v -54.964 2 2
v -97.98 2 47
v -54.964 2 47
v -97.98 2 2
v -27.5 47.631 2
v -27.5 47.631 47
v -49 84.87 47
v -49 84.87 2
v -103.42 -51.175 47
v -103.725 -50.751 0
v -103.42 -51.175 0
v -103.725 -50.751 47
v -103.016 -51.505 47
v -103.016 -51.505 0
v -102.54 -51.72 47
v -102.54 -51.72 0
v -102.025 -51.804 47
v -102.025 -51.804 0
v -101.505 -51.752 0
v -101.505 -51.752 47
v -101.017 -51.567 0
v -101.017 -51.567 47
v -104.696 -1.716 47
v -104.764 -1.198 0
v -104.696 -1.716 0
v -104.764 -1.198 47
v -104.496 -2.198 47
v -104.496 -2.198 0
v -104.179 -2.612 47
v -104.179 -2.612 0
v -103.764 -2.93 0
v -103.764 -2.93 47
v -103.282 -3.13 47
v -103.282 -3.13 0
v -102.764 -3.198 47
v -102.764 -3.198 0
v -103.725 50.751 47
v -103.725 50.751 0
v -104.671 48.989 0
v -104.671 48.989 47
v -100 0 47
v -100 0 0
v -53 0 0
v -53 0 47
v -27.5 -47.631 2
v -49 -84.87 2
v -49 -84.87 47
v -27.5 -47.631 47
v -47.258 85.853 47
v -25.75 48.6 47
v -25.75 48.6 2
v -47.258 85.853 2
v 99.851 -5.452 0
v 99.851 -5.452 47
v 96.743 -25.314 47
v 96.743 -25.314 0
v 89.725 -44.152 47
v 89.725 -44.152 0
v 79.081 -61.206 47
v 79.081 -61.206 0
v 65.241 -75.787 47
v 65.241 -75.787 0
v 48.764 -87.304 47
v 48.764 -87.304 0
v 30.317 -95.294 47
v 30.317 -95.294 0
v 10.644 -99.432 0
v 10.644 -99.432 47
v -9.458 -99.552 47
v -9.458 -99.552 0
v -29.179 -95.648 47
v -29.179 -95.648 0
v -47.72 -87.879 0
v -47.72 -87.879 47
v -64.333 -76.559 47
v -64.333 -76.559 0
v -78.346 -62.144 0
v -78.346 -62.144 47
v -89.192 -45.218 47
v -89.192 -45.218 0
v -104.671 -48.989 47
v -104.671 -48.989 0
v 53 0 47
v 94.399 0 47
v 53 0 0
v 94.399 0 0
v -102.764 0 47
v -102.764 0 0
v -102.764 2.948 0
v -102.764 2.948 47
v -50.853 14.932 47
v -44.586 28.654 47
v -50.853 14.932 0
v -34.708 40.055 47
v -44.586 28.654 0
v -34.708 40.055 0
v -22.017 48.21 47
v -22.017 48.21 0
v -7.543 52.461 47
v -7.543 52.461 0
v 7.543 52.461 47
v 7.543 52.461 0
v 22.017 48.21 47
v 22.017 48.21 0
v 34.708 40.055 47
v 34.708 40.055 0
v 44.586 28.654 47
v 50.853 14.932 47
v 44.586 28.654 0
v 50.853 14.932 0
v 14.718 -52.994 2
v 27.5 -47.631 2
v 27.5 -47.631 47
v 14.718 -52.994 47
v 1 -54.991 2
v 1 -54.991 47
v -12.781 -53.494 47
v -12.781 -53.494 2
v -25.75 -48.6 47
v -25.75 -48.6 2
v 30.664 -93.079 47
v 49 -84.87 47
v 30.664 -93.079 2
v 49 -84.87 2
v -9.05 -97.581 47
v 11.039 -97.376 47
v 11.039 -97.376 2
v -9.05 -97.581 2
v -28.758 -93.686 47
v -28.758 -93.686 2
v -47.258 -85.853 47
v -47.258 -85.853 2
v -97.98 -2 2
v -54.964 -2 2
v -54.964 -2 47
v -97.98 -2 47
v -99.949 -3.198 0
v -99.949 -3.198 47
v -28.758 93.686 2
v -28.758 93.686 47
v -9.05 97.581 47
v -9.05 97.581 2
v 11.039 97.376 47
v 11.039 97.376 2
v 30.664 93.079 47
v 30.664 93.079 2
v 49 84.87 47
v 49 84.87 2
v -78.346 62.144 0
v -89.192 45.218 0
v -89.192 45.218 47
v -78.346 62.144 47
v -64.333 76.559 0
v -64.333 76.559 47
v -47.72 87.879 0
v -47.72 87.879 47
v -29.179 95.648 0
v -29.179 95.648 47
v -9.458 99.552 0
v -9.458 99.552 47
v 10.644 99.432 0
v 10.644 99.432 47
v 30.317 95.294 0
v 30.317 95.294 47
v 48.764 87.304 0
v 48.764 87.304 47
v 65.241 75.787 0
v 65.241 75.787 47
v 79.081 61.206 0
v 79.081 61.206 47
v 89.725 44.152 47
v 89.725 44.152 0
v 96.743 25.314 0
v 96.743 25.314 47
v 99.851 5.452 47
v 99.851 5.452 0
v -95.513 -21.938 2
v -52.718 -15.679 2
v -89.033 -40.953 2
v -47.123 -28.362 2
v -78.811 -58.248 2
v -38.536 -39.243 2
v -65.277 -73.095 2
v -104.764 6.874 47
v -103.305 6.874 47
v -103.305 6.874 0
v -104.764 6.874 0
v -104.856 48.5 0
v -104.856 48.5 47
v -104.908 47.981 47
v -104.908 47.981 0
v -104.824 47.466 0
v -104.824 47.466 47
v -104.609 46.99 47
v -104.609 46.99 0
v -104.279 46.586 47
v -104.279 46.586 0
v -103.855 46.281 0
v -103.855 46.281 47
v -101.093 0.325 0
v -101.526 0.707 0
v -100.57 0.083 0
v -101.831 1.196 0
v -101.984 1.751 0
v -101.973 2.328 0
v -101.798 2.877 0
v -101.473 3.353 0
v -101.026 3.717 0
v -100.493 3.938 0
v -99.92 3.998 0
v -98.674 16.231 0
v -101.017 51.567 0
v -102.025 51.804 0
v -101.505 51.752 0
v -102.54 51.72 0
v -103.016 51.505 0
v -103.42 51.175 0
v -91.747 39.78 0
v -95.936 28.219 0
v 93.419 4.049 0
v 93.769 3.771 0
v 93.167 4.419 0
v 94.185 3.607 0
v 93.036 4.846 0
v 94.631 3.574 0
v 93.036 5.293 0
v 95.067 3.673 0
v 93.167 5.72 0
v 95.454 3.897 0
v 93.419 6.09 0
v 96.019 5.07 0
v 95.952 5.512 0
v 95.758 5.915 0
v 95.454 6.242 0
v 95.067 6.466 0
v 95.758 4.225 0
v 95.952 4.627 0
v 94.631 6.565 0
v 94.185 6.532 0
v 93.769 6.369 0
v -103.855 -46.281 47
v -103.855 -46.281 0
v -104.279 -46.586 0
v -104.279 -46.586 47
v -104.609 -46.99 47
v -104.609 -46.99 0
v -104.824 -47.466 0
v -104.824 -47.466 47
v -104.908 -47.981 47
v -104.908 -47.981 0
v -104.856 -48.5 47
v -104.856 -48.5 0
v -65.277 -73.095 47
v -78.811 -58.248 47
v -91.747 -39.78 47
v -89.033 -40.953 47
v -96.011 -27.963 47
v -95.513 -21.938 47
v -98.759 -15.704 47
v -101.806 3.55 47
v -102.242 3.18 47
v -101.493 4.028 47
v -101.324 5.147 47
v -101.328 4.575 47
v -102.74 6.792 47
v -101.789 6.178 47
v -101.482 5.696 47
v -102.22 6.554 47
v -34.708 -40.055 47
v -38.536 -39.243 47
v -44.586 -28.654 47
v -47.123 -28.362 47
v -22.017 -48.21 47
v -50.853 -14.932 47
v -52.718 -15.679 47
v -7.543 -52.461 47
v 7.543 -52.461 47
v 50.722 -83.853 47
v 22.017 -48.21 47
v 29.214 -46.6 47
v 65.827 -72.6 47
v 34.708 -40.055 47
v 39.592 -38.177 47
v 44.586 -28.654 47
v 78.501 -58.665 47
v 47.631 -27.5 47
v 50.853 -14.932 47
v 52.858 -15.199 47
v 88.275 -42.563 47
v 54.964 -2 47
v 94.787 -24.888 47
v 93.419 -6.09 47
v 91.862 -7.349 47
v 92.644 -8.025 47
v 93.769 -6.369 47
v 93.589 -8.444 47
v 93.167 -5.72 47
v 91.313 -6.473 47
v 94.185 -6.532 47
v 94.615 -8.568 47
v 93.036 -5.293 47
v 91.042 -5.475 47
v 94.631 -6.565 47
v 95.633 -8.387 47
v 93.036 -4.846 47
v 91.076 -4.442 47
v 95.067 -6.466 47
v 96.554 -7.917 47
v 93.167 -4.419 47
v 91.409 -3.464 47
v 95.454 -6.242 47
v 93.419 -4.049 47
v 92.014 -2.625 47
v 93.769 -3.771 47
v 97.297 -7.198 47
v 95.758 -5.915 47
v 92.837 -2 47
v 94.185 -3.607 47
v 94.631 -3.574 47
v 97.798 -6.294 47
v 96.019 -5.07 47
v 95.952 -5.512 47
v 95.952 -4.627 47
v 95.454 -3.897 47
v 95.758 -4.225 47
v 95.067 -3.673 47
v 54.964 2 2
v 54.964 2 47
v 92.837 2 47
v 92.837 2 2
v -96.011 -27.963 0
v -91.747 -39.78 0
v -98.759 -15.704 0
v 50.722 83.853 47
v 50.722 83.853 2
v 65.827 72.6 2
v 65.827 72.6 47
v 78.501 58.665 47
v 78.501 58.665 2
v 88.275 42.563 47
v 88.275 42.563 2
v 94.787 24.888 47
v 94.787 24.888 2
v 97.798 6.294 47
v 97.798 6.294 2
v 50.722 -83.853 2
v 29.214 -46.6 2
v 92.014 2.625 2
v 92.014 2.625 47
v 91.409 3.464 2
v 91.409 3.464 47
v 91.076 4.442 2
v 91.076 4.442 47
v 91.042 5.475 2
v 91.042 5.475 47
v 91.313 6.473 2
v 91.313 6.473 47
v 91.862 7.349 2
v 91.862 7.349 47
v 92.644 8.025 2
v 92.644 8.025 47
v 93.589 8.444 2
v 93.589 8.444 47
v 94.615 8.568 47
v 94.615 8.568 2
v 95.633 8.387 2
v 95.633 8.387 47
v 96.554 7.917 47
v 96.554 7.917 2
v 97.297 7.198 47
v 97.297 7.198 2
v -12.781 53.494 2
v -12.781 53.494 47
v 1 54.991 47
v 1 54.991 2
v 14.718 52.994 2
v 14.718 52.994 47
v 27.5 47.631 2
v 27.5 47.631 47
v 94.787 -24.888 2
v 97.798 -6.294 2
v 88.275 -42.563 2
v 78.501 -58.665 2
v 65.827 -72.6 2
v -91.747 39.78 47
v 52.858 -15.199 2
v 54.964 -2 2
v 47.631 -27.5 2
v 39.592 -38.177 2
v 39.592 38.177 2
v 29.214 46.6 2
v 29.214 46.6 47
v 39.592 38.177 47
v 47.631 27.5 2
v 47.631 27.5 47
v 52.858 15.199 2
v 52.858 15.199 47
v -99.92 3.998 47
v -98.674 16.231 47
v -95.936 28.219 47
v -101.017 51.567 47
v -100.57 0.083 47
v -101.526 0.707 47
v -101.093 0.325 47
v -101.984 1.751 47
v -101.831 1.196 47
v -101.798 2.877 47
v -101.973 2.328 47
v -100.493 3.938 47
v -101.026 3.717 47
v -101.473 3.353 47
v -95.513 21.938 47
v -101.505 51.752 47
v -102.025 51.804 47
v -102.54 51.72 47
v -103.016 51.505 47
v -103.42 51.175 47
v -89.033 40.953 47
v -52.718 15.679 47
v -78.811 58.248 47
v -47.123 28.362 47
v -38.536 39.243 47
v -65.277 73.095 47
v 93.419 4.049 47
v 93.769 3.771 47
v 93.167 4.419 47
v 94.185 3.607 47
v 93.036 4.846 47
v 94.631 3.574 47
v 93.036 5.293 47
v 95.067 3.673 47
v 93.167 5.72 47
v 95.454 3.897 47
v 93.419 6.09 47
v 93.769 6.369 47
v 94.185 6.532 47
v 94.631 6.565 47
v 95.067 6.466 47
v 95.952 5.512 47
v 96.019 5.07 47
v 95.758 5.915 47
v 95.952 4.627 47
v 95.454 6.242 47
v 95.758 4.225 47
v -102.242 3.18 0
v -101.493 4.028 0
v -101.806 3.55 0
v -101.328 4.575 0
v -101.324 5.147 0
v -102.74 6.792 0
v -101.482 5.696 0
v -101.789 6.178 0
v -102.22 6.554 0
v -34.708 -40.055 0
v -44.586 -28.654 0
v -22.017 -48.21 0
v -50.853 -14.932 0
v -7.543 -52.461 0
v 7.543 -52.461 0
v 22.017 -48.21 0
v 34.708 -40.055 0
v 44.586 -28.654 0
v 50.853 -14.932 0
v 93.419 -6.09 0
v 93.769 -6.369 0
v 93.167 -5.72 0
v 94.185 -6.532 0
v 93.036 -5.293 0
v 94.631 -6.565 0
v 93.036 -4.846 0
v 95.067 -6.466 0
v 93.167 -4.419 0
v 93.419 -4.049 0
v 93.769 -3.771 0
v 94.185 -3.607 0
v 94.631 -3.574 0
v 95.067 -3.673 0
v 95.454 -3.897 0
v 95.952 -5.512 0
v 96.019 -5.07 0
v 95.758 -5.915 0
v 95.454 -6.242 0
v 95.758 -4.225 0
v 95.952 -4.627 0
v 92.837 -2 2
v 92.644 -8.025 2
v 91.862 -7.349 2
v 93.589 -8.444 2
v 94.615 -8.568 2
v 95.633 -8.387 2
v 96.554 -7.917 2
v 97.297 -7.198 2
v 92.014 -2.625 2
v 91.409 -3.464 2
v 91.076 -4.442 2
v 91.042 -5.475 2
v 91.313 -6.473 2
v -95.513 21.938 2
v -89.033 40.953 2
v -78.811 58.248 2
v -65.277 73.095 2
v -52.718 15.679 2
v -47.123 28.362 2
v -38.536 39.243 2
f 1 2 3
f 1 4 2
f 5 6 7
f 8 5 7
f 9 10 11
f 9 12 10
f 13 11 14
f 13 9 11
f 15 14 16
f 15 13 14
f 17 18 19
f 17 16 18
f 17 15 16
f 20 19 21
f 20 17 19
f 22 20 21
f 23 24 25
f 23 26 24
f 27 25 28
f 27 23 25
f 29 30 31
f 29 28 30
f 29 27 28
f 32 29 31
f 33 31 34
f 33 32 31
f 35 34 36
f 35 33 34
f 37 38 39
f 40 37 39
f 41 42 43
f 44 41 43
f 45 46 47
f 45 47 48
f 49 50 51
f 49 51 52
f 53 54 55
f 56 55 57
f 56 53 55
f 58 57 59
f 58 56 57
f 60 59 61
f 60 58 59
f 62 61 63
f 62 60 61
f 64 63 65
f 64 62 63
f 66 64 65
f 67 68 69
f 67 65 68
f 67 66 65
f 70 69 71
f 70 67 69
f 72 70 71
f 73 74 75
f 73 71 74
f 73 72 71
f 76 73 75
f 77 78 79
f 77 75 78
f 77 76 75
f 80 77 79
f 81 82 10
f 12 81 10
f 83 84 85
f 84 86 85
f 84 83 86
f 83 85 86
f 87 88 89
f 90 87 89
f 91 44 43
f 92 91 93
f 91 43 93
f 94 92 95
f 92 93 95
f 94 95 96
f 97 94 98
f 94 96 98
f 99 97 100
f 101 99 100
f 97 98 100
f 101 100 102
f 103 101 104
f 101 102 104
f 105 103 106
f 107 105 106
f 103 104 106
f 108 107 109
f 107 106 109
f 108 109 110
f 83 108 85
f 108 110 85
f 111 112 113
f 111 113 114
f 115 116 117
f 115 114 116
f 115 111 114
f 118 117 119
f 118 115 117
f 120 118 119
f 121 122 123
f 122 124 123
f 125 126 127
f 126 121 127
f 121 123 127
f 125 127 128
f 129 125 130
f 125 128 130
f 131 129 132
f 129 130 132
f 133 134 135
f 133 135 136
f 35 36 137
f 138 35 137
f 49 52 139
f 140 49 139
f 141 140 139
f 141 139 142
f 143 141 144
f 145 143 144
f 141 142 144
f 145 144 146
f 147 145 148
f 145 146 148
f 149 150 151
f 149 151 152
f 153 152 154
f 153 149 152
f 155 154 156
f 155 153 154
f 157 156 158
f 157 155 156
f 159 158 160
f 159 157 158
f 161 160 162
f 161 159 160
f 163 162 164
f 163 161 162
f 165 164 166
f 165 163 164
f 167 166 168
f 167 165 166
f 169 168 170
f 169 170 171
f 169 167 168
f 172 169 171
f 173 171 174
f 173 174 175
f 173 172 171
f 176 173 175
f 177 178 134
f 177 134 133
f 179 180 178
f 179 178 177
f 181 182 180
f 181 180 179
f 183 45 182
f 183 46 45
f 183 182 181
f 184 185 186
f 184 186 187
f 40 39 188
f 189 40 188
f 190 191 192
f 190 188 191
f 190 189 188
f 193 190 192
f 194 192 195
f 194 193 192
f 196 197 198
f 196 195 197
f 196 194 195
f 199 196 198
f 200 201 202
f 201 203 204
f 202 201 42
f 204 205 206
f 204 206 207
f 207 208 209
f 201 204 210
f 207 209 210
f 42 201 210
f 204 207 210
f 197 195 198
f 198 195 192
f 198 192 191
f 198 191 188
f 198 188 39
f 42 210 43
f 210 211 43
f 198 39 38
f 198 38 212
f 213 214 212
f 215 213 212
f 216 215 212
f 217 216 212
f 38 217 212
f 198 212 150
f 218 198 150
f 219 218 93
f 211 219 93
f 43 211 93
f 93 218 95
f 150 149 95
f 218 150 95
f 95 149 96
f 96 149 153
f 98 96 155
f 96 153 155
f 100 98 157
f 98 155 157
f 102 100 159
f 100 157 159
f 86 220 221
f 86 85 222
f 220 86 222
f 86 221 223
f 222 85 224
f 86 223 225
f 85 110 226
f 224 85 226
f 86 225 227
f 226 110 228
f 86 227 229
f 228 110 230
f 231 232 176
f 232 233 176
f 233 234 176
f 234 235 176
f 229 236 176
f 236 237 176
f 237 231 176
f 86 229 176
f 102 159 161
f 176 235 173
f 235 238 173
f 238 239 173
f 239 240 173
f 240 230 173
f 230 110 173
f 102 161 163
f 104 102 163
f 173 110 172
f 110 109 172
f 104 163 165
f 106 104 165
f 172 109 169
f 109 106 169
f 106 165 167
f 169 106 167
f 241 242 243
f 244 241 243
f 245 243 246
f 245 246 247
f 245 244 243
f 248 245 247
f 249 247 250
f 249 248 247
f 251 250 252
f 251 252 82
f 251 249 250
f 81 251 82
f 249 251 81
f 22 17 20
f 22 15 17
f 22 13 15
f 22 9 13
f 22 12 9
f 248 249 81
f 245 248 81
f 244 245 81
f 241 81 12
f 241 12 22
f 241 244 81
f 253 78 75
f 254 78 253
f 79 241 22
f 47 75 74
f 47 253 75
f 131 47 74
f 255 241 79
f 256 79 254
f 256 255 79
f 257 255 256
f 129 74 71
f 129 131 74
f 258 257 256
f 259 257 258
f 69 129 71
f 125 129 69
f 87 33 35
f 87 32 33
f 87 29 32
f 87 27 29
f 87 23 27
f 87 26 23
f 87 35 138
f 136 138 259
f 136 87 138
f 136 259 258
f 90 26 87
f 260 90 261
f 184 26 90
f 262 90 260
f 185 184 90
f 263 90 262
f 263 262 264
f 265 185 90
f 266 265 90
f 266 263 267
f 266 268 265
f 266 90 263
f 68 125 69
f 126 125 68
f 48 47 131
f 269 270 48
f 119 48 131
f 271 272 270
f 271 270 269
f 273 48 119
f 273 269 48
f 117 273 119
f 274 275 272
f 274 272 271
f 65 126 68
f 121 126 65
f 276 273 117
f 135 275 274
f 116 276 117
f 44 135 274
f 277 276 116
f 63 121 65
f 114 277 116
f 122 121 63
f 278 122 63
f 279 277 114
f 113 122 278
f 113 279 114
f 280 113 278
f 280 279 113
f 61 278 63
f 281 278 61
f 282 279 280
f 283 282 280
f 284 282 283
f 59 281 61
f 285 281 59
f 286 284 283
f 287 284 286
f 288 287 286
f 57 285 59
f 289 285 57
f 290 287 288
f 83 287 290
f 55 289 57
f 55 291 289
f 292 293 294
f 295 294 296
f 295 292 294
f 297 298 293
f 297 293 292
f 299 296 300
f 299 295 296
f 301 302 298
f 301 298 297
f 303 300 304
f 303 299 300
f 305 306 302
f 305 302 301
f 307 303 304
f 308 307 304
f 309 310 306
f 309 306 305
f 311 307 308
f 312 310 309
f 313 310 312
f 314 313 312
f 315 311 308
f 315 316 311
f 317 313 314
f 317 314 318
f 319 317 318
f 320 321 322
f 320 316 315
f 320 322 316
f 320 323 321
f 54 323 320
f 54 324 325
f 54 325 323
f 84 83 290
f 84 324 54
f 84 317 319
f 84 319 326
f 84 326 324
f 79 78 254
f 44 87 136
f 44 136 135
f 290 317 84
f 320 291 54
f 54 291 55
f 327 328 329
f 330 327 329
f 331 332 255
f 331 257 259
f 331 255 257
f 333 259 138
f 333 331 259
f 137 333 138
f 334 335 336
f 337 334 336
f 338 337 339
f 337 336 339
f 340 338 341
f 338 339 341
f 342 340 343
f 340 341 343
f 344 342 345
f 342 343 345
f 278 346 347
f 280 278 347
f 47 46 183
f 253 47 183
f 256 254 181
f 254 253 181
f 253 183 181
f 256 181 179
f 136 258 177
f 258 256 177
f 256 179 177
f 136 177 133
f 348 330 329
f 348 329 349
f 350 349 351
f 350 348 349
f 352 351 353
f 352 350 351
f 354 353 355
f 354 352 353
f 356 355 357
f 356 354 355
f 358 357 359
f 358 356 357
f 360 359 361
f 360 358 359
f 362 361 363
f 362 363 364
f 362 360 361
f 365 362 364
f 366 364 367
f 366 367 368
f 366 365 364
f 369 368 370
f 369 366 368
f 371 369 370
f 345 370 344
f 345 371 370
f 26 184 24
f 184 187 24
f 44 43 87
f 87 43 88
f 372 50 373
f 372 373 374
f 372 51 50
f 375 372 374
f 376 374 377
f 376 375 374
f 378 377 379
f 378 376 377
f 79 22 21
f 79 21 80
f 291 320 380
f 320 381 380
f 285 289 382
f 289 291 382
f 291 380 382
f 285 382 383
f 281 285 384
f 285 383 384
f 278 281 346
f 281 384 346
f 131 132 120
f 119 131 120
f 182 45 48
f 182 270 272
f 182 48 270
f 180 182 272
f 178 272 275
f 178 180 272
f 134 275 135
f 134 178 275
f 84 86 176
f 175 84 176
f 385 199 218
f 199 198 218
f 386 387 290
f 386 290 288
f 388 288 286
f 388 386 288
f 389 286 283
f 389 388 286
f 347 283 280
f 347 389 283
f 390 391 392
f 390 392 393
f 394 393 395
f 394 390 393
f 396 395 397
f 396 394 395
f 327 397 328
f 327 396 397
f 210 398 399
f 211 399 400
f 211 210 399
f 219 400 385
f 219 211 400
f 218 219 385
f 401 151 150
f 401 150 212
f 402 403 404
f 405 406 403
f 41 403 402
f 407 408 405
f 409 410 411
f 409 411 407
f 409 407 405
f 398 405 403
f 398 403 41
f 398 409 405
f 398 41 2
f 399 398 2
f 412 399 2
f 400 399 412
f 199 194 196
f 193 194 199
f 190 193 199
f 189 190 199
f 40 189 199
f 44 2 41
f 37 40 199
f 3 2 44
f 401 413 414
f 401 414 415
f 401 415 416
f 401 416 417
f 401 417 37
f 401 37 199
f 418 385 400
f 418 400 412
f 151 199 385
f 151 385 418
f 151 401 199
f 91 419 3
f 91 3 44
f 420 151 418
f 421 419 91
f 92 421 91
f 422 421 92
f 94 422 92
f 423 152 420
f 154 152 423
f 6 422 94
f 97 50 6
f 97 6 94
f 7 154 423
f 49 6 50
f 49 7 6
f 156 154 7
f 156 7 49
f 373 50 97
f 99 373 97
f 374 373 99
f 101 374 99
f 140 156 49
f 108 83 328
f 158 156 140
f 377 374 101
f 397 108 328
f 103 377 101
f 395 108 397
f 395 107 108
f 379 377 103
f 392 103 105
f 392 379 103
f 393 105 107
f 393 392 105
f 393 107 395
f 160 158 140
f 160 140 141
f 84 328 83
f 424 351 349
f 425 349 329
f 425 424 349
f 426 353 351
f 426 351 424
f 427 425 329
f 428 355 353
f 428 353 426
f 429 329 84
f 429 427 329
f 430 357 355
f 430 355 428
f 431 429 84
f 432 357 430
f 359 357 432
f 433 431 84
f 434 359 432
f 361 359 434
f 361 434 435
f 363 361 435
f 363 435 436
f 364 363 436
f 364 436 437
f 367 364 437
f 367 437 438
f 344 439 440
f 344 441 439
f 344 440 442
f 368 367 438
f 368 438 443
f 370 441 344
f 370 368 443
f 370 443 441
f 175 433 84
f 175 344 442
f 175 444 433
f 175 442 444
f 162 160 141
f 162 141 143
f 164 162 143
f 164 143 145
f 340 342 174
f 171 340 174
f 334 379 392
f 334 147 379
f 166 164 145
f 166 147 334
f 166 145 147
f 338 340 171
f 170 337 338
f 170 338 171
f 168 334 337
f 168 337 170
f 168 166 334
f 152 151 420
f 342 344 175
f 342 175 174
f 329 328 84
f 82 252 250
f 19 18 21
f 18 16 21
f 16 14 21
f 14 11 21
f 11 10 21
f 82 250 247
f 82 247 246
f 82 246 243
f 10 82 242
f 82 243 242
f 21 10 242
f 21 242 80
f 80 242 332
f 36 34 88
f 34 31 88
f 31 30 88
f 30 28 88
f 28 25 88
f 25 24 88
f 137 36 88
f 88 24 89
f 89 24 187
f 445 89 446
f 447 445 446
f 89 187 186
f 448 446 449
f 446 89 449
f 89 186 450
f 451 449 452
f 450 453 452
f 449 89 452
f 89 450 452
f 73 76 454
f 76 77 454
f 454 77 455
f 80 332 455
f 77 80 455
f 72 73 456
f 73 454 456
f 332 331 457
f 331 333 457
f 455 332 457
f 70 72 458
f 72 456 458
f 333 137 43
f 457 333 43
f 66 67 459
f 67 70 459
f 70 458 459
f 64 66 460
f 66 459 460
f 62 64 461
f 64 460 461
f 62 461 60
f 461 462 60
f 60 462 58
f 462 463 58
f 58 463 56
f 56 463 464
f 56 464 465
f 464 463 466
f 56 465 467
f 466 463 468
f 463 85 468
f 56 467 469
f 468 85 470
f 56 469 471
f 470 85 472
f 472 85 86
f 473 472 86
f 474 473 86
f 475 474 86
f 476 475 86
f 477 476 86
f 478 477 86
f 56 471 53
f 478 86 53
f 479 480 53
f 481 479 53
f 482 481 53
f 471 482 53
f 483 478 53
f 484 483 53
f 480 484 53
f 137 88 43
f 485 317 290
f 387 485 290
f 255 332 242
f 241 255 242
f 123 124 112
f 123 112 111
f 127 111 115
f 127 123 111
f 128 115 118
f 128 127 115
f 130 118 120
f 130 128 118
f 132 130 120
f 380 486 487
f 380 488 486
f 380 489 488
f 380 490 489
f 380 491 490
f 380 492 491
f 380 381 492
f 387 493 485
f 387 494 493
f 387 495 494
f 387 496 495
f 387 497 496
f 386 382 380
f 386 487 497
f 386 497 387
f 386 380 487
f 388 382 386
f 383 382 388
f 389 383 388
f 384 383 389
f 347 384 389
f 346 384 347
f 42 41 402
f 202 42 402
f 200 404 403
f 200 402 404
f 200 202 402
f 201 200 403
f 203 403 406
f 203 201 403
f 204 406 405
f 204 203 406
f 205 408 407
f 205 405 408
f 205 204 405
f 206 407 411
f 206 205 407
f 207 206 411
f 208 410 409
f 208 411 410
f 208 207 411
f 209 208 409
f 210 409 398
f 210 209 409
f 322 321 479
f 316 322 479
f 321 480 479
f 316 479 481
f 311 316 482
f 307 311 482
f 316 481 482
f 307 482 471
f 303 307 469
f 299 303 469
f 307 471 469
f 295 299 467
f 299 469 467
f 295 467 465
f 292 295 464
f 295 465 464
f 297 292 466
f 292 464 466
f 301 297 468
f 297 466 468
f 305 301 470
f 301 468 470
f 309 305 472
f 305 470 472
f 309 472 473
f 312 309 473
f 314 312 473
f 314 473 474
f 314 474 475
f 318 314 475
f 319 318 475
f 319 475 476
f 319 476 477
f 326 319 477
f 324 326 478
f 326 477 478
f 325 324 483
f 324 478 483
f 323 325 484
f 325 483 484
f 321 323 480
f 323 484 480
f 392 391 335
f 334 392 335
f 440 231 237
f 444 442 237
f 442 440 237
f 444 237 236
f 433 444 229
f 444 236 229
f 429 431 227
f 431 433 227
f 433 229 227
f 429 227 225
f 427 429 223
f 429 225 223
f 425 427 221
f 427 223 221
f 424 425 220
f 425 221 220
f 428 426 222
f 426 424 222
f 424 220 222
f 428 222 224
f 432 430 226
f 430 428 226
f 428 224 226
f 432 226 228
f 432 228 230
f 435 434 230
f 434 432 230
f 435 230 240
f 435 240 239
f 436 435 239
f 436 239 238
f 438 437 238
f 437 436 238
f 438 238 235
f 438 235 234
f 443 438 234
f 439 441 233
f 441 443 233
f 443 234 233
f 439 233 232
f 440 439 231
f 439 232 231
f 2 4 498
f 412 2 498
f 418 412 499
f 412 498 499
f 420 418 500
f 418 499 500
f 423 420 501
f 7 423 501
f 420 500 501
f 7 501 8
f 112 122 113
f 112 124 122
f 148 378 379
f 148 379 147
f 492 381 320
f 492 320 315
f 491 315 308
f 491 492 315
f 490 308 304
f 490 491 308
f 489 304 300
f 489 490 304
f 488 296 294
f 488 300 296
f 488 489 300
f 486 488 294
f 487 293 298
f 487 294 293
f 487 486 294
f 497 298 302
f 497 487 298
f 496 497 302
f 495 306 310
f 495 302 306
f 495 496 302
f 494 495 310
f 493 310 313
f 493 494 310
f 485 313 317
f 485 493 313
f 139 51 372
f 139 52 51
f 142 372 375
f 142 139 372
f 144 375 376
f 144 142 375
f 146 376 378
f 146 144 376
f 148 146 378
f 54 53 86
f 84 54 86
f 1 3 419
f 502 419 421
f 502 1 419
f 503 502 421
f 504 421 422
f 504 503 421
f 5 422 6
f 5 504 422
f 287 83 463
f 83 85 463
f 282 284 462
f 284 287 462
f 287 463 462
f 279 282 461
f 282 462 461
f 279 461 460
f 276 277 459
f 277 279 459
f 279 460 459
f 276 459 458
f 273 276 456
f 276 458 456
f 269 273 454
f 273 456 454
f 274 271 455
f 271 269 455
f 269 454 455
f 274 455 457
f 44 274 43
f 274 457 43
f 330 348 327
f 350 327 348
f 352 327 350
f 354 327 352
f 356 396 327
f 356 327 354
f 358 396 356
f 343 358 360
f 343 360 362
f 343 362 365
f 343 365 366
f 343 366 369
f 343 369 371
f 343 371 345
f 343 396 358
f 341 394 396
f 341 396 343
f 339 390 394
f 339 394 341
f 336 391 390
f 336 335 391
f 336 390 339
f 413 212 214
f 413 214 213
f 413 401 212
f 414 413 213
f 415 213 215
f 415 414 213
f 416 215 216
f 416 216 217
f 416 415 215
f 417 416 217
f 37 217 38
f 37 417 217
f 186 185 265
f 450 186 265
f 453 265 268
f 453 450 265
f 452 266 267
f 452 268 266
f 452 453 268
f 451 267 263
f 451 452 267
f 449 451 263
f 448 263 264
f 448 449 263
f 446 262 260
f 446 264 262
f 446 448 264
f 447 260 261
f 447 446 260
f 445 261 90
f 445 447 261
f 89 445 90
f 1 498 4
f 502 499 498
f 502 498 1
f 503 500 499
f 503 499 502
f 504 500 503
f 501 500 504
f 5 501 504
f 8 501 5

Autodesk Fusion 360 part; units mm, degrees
sketch "Sketch1" plane through (0, 0, 0) normal (0, 0, 1) x (1, 0, 0)
  arc A0 (100, 0) -> (-100, 0) centre (0, 0) ccw
  line L0 (0, 0) -> (100, 0) construction
  line L1 (0, 0) -> (-100, 0) construction
  arc A1 (53, 0) -> (-53, 0) centre (0, 0) ccw
  line L2 (0, 0) -> (53, 0) construction
  line L3 (0, 0) -> (-53, 0) construction
  line L4 (-100, 0) -> (-53, 0)
  line L5 (53, 0) -> (100, 0)
  line L6 (94.399, 0) -> (99.8513, 5.4523)
  line L7 (94.399, 0) -> (102.1097, 0) construction
  line L8 (-89.1925, 45.2184) -> (-102.7789, 52.5129)
  line L9 (-102.7789, 52.5129) -> (-105.6171, 47.2267)
  line L10 (-105.6171, 47.2267) -> (-91.7472, 39.78)
  circle A2 centre (94.5188, 5.0696) radius 1.5
  circle A3 centre (94.5188, 5.0696) radius 2.5
  line L11 (0, 0) -> (-50, 86.6025)
  line L12 (0, 0) -> (50, 86.6025)
  line L13 (1.7321, 1) -> (-48.2679, 87.6025)
  line L14 (1.7321, -1) -> (51.7321, 85.6025)
  dimension "d1" = 100
  dimension "d5" = 47
  dimension "d6" = 45
  dimension "d7" = 6
  dimension "d11" = 3
  dimension "d12" = 2
  dimension "d13" = 5
  dimension "d25" = 60
  dimension "d26" = 60
  dimension "d27" = 2
  dimension "d28" = 2
extrude "Extrude1" add sketch "Sketch1" along normal blind 47 contours A0 A1 L5 L6 L14 | A0 A1 L12 L14 | A0 A1 L12 L13 | A0 A1 L11 L13 | A0 A1 L4 L11 | A3 makes body 1
shell "Shell1" thickness 2 removed faces 1 at (80.8693, 23.265, 47) on bodies 1
extrude "Extrude2" add sketch "Sketch1" along normal up to surface (47 mm away) contours A0 L8 L9 L10 bodies 1
extrude "Extrude5" add sketch "Sketch1" along normal up to surface (47 mm away) contours A0 A1 L12 L14 | A0 A1 L11 L13 bodies 1
mirror "Mirror1" about plane through (0, 0, 0) normal (0, 1, 0) of bodies 1 makes body 2
sketch "Sketch2" plane through (0, 0, 0) normal (0, 0, 1) x (1, 0, 0)
  arc A0 (100, 0) -> (-100, 0) centre (0, 0) ccw
  arc A1 (-100, 0) -> (-91.7472, -39.78) centre (0, 0) ccw
  arc A2 (-99.3608, 3.8951) -> (-100, 0) centre (-100, 2) ccw
  line L0 (-100, 0) -> (-102.7643, 0)
  line L1 (-102.7643, 0) -> (-102.7643, 2.9485)
  arc A3 (-99.8526, 5.4275) -> (-99.8385, 5.6804) centre (-101.6525, 5.6545) ccw
  arc A4 (-102.7643, 2.9485) -> (-103.3053, 6.8739) centre (-103.3053, 4.8739) ccw
  line L2 (-103.3053, 6.8739) -> (-104.7643, 6.8739)
  line L3 (-104.7643, 6.8739) -> (-104.7643, -3.198)
  line L4 (-104.7643, -3.198) -> (-99.9489, -3.198)
  line L5 (-100, 0) -> (-53, 0)
  dimension "d17" = 2
  dimension "d18" = 2
  dimension "d19" = 2
extrude "Extrude3" add sketch "Sketch2" along normal up to surface (47 mm away) separate body contours A1 L0 L1 A4 L2 L3 L4 makes body 3
extrude "Extrude4" add sketch "Sketch2" along normal up to surface (47 mm away) separate body contours A0 A2 makes body 4
combine "Combine1" operation add target body 4 tool bodies 1
combine "Combine2" operation add target body 2 tool bodies 3
fillet "Fillet1" radius 2 5 edges at (-102.7789, -52.5129, 23.5) (-105.6171, -47.2267, 23.5) (-104.7643, -3.198, 23.5) (-105.6171, 47.2267, 23.5) (-102.7789, 52.5129, 23.5) on bodies 2 4
